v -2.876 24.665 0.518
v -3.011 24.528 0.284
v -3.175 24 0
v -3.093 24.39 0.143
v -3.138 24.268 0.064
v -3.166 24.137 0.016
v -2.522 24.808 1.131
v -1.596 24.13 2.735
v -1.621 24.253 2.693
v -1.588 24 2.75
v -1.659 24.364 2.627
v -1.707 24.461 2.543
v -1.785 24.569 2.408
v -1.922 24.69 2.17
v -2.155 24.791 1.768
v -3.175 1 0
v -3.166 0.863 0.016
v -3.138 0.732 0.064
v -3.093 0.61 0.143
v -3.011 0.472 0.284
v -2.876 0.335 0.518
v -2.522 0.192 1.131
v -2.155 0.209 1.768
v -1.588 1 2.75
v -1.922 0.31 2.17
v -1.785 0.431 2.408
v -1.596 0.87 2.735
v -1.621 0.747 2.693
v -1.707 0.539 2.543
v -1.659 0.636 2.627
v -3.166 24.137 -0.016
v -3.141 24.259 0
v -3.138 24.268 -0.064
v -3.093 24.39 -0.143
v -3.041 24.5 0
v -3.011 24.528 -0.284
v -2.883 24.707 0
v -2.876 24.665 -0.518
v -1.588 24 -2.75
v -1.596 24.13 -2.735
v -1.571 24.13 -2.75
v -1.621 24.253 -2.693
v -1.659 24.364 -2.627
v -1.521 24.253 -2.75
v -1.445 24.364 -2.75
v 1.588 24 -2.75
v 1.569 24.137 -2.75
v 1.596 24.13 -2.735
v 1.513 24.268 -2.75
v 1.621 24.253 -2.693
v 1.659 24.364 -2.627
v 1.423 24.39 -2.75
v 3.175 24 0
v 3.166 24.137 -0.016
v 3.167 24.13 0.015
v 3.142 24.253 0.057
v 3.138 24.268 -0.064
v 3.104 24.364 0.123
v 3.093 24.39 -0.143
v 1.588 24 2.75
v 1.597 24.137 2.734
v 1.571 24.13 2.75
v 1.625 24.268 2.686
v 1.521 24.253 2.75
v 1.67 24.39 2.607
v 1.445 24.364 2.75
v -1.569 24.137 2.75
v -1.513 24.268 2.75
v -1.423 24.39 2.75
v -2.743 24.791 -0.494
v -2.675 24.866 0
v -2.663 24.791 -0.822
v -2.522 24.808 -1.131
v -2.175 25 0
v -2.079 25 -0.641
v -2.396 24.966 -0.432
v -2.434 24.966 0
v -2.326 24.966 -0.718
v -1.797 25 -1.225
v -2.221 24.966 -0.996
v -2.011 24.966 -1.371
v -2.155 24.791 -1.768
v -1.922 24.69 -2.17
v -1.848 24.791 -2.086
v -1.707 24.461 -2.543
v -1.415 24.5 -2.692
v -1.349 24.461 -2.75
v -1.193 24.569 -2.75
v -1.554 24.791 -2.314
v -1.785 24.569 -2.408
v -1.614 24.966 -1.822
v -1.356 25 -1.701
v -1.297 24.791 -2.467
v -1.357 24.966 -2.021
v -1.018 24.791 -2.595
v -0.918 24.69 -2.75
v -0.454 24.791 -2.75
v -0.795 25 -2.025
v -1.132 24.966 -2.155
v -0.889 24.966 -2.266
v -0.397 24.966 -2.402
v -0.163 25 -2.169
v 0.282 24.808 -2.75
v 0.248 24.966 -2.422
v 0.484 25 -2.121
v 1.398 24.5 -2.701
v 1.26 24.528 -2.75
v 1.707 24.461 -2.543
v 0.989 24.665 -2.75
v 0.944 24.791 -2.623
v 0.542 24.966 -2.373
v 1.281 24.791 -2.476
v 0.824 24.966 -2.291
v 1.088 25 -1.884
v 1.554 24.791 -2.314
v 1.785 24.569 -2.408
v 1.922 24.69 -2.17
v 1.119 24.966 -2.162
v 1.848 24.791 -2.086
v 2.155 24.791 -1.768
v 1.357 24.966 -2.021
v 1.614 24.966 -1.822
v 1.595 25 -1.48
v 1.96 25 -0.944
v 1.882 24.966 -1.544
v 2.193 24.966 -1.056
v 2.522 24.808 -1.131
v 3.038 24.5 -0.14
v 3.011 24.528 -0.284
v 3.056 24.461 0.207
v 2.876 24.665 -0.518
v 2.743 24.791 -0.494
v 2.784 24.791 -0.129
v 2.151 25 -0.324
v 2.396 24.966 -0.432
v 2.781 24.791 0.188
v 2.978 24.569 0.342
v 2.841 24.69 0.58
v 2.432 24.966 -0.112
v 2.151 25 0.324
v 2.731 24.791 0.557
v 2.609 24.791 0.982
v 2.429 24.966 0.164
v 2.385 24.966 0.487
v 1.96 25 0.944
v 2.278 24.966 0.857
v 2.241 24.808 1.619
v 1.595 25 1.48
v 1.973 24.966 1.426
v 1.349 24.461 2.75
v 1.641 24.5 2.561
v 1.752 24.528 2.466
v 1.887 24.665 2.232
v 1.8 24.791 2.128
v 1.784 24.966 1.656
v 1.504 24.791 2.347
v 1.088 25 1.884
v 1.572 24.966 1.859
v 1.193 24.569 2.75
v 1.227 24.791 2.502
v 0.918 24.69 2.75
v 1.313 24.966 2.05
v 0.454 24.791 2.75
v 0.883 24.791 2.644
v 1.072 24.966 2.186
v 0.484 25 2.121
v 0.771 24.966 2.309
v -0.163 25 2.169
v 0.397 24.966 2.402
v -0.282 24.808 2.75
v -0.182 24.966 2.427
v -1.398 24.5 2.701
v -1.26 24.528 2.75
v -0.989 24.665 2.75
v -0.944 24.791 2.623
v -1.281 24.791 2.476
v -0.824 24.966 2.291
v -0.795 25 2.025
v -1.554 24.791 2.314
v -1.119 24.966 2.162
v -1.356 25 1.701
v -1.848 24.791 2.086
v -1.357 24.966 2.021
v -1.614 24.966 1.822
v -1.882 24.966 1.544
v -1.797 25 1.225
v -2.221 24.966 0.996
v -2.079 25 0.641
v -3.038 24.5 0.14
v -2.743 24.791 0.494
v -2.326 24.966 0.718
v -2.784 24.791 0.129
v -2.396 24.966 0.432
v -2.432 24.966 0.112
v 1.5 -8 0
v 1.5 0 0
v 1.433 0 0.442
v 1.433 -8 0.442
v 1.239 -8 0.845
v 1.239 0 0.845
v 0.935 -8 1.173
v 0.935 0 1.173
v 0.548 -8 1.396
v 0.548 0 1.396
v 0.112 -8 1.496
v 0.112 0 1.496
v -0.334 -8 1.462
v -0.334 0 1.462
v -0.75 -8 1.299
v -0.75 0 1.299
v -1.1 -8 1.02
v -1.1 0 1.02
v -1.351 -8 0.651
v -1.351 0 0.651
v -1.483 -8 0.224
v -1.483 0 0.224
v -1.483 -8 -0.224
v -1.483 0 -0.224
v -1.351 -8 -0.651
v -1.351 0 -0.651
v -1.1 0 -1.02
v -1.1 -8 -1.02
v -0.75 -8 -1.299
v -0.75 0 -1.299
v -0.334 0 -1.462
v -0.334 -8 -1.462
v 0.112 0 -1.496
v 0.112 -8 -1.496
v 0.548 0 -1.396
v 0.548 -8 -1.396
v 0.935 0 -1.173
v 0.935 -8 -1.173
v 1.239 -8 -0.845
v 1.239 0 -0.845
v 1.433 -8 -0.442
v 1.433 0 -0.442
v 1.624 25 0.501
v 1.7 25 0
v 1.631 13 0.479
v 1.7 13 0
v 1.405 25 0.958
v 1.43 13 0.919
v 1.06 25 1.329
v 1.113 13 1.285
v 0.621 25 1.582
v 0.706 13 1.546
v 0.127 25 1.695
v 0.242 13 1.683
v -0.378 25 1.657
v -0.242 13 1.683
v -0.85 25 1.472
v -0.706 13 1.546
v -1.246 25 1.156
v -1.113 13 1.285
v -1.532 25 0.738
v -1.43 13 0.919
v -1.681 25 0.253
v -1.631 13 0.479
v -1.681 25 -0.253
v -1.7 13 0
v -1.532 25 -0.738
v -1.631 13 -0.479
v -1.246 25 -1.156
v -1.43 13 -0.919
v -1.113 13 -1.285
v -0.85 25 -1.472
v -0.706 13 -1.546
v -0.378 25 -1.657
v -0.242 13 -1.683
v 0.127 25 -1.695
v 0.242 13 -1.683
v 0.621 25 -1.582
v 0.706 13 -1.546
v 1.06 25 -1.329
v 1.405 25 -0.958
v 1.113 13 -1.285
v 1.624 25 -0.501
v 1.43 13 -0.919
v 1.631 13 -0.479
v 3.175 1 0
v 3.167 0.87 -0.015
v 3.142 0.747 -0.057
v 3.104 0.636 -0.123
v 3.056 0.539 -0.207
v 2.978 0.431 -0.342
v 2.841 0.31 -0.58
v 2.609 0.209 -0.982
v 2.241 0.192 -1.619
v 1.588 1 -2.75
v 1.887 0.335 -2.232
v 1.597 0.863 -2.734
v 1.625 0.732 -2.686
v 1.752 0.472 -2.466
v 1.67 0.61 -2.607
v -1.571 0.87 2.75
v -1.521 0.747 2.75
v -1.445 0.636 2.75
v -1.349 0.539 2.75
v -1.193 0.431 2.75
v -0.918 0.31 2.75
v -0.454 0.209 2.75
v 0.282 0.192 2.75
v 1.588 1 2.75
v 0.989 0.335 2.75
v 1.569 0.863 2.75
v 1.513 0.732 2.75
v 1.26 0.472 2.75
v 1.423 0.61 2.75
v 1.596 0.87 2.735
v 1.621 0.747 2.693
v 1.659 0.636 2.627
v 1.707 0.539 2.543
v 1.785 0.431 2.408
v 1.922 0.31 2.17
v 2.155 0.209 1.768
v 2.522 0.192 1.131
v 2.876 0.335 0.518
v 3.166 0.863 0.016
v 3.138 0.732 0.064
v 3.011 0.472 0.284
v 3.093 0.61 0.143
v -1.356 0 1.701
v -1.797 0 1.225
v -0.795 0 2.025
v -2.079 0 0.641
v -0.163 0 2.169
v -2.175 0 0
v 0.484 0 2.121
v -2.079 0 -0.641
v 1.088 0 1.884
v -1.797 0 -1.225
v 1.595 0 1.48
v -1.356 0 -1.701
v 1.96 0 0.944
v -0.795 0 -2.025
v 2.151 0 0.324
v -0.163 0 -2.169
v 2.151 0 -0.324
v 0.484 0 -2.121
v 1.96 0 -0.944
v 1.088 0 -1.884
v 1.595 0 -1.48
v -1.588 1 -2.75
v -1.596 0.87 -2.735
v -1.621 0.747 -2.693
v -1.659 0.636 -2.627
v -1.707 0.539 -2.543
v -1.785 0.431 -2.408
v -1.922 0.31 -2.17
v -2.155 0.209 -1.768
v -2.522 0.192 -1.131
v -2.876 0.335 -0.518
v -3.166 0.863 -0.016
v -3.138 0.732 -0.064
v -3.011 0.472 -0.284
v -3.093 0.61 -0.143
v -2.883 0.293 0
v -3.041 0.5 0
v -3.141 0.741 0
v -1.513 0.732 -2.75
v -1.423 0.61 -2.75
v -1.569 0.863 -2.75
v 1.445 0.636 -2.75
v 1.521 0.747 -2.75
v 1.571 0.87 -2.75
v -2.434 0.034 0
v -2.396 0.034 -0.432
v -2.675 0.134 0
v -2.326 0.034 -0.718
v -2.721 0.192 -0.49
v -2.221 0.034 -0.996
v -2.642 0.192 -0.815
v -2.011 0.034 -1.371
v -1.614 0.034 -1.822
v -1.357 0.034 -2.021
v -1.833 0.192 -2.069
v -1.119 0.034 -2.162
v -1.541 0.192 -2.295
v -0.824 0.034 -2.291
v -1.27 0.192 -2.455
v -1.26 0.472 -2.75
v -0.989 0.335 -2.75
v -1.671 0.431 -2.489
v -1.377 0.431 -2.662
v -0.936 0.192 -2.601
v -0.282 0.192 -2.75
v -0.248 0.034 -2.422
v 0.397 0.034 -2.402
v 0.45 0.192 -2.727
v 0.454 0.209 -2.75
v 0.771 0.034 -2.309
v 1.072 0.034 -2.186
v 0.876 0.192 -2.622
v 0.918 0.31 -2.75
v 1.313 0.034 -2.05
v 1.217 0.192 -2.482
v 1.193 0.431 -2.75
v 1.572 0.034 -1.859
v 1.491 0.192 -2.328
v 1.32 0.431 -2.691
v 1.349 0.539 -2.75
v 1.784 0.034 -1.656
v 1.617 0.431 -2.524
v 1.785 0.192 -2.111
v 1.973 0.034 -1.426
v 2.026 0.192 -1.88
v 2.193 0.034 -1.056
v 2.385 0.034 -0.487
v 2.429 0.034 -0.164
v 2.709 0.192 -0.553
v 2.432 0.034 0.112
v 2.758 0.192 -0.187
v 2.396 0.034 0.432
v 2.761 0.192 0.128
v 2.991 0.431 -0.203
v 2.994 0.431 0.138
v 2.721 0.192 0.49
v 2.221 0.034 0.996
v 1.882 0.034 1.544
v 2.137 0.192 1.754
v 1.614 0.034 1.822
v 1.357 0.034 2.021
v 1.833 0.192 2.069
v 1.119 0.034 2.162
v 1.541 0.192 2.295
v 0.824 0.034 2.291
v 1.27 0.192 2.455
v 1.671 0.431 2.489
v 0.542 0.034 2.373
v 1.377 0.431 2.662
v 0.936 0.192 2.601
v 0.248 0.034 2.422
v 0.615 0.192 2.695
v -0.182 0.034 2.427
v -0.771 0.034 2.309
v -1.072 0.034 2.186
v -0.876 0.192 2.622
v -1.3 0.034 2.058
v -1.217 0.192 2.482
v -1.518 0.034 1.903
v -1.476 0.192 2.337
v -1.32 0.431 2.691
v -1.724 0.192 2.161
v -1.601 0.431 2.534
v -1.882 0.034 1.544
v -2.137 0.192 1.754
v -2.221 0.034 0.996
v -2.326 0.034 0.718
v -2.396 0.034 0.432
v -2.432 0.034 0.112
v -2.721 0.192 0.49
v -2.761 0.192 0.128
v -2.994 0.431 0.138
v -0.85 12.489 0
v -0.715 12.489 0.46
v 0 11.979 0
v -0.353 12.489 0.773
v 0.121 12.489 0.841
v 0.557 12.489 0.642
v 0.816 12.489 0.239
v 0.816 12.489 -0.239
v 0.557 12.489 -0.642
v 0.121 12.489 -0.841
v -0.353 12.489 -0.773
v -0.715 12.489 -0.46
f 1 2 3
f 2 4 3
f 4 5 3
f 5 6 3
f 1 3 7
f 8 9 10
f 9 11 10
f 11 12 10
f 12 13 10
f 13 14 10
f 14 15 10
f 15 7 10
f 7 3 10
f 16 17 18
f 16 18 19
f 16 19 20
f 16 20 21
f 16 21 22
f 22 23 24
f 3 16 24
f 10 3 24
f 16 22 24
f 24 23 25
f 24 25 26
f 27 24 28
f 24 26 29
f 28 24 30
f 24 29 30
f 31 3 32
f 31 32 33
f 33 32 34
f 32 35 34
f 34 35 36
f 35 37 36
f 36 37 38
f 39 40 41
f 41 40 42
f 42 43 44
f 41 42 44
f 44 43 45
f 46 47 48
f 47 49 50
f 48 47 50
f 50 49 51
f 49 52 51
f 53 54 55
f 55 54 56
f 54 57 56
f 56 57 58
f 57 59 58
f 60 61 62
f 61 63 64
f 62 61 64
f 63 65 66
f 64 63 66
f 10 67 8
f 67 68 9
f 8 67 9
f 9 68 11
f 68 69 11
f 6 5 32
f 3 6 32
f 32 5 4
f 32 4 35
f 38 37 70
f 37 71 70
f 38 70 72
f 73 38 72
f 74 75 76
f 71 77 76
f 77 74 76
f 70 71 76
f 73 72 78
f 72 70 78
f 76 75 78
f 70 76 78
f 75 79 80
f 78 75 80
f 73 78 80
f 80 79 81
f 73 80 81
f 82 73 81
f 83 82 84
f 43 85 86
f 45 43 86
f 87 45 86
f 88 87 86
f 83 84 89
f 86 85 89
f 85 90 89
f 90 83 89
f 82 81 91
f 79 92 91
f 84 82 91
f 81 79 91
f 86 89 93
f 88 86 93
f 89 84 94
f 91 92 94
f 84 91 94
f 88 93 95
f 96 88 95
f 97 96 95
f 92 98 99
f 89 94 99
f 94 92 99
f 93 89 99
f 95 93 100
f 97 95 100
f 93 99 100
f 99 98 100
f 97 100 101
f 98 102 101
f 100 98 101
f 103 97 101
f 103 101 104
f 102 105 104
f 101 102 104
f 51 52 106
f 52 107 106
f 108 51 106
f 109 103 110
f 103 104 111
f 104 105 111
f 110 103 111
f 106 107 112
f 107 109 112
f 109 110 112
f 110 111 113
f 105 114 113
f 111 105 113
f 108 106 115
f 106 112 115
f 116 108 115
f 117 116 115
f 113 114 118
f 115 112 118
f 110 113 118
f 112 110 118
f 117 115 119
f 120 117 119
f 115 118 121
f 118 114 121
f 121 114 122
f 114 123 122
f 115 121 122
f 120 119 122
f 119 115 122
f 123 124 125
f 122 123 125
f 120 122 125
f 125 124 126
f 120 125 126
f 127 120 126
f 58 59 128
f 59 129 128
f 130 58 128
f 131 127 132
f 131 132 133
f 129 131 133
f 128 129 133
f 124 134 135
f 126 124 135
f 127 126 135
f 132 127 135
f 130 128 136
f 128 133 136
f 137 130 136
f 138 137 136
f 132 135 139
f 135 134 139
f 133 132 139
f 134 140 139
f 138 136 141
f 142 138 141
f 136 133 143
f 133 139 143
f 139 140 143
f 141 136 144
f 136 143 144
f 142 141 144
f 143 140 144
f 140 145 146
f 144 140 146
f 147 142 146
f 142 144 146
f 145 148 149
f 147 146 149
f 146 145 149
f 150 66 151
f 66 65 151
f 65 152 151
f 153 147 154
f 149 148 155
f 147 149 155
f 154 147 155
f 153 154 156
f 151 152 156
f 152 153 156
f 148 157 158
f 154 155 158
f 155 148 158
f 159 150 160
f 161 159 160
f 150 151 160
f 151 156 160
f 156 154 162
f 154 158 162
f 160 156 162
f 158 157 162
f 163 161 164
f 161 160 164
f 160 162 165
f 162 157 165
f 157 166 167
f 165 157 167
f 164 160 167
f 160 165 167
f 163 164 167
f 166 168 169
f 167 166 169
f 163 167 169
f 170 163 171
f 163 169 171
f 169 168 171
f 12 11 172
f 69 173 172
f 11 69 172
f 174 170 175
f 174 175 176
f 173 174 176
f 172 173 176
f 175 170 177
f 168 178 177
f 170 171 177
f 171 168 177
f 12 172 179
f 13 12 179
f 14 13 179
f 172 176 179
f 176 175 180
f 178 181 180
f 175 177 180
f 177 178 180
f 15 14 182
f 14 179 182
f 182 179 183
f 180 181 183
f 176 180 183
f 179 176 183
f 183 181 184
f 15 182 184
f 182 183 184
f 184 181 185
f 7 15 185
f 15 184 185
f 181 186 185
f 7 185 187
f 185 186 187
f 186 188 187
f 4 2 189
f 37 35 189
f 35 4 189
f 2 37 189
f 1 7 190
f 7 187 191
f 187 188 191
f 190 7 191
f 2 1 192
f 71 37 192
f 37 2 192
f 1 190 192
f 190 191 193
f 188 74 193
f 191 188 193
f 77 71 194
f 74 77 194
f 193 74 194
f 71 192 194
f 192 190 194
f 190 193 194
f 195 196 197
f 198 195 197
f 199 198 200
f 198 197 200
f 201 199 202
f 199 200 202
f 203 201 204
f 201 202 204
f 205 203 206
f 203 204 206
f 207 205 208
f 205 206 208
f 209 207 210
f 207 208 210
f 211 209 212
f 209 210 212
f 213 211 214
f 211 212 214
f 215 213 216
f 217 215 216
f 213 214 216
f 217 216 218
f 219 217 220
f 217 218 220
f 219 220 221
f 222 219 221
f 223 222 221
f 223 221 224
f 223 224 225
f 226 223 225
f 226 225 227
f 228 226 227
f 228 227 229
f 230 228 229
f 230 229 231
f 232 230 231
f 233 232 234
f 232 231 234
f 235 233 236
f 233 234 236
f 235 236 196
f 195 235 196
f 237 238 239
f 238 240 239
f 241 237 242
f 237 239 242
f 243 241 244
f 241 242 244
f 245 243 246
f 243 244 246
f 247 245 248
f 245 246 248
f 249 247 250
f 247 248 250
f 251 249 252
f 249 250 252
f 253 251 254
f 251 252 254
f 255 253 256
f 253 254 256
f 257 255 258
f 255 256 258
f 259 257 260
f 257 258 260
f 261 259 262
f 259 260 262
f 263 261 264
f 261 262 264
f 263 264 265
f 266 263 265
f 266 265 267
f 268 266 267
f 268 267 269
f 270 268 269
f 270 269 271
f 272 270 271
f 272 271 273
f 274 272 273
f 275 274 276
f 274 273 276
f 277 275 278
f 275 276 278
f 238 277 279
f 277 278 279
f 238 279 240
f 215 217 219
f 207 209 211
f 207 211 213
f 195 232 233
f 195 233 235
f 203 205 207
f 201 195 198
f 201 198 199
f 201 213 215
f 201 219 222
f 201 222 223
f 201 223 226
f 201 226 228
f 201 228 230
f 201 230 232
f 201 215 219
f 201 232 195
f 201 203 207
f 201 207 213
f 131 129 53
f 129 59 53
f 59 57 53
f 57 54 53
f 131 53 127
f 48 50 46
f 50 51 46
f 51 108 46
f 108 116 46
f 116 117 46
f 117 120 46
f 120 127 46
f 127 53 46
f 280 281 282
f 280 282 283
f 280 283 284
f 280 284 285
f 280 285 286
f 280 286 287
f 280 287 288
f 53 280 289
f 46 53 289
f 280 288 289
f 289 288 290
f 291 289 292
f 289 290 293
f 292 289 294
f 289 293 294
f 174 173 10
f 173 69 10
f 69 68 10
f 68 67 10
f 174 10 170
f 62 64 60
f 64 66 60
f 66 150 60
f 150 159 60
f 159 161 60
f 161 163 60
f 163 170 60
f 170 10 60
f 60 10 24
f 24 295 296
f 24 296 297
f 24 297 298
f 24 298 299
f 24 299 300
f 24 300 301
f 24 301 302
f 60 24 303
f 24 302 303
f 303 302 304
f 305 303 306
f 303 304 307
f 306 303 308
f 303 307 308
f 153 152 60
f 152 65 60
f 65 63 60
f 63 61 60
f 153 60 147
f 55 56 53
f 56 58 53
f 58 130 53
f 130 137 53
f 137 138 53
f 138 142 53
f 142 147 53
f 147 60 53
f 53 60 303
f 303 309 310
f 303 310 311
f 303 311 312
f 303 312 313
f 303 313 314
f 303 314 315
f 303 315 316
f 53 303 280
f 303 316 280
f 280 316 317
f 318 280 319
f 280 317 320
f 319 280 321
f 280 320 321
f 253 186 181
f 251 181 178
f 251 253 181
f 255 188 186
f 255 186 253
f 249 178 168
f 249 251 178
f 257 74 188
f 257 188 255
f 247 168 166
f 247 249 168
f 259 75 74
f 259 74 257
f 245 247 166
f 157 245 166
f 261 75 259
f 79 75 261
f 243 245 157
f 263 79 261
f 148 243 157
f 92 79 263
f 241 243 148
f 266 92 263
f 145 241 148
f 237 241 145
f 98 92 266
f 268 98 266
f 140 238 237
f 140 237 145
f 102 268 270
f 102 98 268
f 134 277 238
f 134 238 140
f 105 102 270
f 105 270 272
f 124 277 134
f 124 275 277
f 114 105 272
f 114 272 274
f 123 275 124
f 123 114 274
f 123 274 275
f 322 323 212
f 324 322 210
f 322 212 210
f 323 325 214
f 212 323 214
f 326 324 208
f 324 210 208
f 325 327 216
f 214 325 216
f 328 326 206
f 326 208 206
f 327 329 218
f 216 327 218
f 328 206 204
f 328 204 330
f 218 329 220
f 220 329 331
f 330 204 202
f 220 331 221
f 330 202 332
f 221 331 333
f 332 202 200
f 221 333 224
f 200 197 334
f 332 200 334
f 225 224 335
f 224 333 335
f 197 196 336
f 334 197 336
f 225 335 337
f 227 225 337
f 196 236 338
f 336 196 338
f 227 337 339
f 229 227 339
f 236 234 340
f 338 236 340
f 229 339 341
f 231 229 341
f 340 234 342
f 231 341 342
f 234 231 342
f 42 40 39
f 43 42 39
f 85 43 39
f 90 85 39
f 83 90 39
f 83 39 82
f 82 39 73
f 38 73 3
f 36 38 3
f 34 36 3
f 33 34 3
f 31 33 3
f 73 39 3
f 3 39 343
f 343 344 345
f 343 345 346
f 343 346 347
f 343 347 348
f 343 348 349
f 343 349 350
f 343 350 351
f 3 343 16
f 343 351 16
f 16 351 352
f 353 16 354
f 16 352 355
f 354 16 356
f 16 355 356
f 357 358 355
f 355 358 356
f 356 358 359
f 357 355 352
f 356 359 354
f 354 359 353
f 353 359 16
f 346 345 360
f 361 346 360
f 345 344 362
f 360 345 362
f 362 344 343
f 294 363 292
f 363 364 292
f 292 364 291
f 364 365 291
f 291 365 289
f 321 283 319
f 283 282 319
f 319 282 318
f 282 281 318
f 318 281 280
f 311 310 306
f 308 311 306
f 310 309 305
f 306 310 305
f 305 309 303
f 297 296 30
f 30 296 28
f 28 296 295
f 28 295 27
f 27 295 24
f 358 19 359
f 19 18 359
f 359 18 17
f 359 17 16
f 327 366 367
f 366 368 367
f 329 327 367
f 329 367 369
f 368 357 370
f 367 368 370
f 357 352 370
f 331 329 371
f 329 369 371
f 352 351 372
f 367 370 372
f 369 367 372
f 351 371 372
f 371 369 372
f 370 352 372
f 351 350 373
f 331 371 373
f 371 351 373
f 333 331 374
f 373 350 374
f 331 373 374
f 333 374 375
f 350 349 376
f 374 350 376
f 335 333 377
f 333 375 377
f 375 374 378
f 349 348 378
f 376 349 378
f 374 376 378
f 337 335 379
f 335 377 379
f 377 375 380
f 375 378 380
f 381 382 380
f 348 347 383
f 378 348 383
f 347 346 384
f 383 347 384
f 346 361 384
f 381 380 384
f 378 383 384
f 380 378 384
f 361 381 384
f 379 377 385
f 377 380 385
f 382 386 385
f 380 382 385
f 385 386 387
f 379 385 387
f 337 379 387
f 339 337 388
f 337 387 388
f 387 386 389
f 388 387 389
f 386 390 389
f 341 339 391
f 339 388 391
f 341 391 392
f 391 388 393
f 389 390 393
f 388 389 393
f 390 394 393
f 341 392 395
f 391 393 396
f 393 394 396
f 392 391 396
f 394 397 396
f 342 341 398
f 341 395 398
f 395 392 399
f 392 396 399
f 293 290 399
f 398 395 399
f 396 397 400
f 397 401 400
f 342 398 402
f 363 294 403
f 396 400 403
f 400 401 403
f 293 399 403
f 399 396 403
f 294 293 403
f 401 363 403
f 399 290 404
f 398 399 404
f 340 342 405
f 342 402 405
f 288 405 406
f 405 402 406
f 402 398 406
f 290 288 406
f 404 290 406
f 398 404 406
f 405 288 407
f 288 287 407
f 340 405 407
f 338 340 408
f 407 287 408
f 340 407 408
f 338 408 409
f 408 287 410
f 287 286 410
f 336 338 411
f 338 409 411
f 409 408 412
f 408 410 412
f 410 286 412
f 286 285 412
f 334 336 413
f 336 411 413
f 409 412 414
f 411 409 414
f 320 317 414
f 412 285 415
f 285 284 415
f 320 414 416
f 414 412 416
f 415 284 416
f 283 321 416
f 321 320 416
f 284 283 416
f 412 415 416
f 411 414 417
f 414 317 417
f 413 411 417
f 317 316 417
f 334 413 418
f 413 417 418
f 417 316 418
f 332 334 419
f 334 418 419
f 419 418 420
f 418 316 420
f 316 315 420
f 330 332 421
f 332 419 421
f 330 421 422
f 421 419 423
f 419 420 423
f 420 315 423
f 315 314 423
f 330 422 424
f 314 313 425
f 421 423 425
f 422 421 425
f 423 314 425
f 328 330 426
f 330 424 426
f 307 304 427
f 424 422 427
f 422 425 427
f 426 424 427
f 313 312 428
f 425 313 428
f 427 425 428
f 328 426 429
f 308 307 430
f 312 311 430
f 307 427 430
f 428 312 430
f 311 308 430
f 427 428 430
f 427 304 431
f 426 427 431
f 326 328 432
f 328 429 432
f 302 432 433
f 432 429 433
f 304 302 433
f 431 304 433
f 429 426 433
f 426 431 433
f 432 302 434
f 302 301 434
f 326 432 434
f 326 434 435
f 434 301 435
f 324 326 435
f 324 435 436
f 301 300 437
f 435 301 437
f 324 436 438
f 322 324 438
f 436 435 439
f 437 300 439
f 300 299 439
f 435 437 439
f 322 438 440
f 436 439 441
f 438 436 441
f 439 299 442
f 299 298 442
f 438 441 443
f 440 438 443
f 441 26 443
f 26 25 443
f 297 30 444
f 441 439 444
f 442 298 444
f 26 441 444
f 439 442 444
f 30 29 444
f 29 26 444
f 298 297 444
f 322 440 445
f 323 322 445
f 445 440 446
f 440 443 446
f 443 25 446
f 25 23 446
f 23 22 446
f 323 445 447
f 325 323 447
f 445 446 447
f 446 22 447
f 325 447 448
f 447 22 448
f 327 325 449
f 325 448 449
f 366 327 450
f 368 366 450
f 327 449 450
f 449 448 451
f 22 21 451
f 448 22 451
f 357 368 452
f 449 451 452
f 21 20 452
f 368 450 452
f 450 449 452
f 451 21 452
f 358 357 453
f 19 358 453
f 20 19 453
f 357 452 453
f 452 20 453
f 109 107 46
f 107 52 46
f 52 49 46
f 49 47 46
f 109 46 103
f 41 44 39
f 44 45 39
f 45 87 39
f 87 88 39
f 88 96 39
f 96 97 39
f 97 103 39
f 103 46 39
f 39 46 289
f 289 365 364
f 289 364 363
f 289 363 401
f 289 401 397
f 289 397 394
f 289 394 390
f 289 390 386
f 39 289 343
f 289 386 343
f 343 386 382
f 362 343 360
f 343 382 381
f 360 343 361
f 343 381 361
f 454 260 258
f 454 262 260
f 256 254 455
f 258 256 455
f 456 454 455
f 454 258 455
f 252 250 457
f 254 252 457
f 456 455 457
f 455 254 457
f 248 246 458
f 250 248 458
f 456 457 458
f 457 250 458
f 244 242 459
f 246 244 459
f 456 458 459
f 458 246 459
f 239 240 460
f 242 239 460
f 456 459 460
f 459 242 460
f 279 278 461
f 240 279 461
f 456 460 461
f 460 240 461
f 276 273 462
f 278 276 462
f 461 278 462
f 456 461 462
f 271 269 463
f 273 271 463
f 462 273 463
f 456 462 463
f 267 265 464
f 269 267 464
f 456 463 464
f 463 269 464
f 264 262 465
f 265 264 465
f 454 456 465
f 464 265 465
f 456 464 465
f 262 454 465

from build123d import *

# Parameters (mm, degrees)
BOSS_EXTRUDE1_DEPTH      = 25
M3_CLEARANCE_HOLE1_D     = 3.4
M3_CLEARANCE_HOLE1_DEPTH = 12
M3_CLEARANCE_HOLE1_TIP   = 1.021463052
SKETCH5_R                = 1.5
BOSS_EXTRUDE2_DEPTH      = 8


with BuildPart() as part:
    # Sketch1 → Boss-Extrude1 (new body)
    with BuildSketch(Plane(origin=(0, 0, 0), x_dir=(1, 0, 0), z_dir=(0, 1, 0))):
        Polygon((3.175426481, 0), (1.58771324, 2.75), (-1.58771324, 2.75), (-3.175426481, 0), (-1.58771324, -2.75), (1.58771324, -2.75), align=None)
    extrude(amount=BOSS_EXTRUDE1_DEPTH)

    # M3 Clearance Hole1
    with Locations(Plane(origin=(0, 25, 0), x_dir=(-1, 0, 0), z_dir=(0, 1, 0))):
        with Locations((0, 0)):
            Hole(M3_CLEARANCE_HOLE1_D / 2, depth=M3_CLEARANCE_HOLE1_DEPTH)
            with Locations((0, 0, -(M3_CLEARANCE_HOLE1_DEPTH + M3_CLEARANCE_HOLE1_TIP / 2))):  # 118° drill point
                Cone(0, M3_CLEARANCE_HOLE1_D / 2, M3_CLEARANCE_HOLE1_TIP, mode=Mode.SUBTRACT)

    # Sketch4 → Cut-Revolve1 (revolve, cut)
    with BuildSketch(Plane.XY):
        with BuildLine():
            Line((-2.175426481, 25), (-3.175426481, 25))
            Line((-3.175426481, 25), (-3.175426481, 24))
            ThreePointArc((-3.175426481, 24), (-2.882533262, 24.707106781), (-2.175426481, 25))
        make_face()
        with BuildLine():
            Line((-3.175426481, 1), (-3.175426481, 0))
            Line((-3.175426481, 0), (-2.175426481, 0))
            ThreePointArc((-2.175426481, 0), (-2.882533262, 0.292893219), (-3.175426481, 1))
        make_face()
    revolve(axis=Axis((0, 25, 0), (0, -1, 0)), mode=Mode.SUBTRACT)

    # Sketch5 → Boss-Extrude2 (add)
    with BuildSketch(Plane.XZ):
        Circle(SKETCH5_R)
    extrude(amount=BOSS_EXTRUDE2_DEPTH)


solid = part.part
